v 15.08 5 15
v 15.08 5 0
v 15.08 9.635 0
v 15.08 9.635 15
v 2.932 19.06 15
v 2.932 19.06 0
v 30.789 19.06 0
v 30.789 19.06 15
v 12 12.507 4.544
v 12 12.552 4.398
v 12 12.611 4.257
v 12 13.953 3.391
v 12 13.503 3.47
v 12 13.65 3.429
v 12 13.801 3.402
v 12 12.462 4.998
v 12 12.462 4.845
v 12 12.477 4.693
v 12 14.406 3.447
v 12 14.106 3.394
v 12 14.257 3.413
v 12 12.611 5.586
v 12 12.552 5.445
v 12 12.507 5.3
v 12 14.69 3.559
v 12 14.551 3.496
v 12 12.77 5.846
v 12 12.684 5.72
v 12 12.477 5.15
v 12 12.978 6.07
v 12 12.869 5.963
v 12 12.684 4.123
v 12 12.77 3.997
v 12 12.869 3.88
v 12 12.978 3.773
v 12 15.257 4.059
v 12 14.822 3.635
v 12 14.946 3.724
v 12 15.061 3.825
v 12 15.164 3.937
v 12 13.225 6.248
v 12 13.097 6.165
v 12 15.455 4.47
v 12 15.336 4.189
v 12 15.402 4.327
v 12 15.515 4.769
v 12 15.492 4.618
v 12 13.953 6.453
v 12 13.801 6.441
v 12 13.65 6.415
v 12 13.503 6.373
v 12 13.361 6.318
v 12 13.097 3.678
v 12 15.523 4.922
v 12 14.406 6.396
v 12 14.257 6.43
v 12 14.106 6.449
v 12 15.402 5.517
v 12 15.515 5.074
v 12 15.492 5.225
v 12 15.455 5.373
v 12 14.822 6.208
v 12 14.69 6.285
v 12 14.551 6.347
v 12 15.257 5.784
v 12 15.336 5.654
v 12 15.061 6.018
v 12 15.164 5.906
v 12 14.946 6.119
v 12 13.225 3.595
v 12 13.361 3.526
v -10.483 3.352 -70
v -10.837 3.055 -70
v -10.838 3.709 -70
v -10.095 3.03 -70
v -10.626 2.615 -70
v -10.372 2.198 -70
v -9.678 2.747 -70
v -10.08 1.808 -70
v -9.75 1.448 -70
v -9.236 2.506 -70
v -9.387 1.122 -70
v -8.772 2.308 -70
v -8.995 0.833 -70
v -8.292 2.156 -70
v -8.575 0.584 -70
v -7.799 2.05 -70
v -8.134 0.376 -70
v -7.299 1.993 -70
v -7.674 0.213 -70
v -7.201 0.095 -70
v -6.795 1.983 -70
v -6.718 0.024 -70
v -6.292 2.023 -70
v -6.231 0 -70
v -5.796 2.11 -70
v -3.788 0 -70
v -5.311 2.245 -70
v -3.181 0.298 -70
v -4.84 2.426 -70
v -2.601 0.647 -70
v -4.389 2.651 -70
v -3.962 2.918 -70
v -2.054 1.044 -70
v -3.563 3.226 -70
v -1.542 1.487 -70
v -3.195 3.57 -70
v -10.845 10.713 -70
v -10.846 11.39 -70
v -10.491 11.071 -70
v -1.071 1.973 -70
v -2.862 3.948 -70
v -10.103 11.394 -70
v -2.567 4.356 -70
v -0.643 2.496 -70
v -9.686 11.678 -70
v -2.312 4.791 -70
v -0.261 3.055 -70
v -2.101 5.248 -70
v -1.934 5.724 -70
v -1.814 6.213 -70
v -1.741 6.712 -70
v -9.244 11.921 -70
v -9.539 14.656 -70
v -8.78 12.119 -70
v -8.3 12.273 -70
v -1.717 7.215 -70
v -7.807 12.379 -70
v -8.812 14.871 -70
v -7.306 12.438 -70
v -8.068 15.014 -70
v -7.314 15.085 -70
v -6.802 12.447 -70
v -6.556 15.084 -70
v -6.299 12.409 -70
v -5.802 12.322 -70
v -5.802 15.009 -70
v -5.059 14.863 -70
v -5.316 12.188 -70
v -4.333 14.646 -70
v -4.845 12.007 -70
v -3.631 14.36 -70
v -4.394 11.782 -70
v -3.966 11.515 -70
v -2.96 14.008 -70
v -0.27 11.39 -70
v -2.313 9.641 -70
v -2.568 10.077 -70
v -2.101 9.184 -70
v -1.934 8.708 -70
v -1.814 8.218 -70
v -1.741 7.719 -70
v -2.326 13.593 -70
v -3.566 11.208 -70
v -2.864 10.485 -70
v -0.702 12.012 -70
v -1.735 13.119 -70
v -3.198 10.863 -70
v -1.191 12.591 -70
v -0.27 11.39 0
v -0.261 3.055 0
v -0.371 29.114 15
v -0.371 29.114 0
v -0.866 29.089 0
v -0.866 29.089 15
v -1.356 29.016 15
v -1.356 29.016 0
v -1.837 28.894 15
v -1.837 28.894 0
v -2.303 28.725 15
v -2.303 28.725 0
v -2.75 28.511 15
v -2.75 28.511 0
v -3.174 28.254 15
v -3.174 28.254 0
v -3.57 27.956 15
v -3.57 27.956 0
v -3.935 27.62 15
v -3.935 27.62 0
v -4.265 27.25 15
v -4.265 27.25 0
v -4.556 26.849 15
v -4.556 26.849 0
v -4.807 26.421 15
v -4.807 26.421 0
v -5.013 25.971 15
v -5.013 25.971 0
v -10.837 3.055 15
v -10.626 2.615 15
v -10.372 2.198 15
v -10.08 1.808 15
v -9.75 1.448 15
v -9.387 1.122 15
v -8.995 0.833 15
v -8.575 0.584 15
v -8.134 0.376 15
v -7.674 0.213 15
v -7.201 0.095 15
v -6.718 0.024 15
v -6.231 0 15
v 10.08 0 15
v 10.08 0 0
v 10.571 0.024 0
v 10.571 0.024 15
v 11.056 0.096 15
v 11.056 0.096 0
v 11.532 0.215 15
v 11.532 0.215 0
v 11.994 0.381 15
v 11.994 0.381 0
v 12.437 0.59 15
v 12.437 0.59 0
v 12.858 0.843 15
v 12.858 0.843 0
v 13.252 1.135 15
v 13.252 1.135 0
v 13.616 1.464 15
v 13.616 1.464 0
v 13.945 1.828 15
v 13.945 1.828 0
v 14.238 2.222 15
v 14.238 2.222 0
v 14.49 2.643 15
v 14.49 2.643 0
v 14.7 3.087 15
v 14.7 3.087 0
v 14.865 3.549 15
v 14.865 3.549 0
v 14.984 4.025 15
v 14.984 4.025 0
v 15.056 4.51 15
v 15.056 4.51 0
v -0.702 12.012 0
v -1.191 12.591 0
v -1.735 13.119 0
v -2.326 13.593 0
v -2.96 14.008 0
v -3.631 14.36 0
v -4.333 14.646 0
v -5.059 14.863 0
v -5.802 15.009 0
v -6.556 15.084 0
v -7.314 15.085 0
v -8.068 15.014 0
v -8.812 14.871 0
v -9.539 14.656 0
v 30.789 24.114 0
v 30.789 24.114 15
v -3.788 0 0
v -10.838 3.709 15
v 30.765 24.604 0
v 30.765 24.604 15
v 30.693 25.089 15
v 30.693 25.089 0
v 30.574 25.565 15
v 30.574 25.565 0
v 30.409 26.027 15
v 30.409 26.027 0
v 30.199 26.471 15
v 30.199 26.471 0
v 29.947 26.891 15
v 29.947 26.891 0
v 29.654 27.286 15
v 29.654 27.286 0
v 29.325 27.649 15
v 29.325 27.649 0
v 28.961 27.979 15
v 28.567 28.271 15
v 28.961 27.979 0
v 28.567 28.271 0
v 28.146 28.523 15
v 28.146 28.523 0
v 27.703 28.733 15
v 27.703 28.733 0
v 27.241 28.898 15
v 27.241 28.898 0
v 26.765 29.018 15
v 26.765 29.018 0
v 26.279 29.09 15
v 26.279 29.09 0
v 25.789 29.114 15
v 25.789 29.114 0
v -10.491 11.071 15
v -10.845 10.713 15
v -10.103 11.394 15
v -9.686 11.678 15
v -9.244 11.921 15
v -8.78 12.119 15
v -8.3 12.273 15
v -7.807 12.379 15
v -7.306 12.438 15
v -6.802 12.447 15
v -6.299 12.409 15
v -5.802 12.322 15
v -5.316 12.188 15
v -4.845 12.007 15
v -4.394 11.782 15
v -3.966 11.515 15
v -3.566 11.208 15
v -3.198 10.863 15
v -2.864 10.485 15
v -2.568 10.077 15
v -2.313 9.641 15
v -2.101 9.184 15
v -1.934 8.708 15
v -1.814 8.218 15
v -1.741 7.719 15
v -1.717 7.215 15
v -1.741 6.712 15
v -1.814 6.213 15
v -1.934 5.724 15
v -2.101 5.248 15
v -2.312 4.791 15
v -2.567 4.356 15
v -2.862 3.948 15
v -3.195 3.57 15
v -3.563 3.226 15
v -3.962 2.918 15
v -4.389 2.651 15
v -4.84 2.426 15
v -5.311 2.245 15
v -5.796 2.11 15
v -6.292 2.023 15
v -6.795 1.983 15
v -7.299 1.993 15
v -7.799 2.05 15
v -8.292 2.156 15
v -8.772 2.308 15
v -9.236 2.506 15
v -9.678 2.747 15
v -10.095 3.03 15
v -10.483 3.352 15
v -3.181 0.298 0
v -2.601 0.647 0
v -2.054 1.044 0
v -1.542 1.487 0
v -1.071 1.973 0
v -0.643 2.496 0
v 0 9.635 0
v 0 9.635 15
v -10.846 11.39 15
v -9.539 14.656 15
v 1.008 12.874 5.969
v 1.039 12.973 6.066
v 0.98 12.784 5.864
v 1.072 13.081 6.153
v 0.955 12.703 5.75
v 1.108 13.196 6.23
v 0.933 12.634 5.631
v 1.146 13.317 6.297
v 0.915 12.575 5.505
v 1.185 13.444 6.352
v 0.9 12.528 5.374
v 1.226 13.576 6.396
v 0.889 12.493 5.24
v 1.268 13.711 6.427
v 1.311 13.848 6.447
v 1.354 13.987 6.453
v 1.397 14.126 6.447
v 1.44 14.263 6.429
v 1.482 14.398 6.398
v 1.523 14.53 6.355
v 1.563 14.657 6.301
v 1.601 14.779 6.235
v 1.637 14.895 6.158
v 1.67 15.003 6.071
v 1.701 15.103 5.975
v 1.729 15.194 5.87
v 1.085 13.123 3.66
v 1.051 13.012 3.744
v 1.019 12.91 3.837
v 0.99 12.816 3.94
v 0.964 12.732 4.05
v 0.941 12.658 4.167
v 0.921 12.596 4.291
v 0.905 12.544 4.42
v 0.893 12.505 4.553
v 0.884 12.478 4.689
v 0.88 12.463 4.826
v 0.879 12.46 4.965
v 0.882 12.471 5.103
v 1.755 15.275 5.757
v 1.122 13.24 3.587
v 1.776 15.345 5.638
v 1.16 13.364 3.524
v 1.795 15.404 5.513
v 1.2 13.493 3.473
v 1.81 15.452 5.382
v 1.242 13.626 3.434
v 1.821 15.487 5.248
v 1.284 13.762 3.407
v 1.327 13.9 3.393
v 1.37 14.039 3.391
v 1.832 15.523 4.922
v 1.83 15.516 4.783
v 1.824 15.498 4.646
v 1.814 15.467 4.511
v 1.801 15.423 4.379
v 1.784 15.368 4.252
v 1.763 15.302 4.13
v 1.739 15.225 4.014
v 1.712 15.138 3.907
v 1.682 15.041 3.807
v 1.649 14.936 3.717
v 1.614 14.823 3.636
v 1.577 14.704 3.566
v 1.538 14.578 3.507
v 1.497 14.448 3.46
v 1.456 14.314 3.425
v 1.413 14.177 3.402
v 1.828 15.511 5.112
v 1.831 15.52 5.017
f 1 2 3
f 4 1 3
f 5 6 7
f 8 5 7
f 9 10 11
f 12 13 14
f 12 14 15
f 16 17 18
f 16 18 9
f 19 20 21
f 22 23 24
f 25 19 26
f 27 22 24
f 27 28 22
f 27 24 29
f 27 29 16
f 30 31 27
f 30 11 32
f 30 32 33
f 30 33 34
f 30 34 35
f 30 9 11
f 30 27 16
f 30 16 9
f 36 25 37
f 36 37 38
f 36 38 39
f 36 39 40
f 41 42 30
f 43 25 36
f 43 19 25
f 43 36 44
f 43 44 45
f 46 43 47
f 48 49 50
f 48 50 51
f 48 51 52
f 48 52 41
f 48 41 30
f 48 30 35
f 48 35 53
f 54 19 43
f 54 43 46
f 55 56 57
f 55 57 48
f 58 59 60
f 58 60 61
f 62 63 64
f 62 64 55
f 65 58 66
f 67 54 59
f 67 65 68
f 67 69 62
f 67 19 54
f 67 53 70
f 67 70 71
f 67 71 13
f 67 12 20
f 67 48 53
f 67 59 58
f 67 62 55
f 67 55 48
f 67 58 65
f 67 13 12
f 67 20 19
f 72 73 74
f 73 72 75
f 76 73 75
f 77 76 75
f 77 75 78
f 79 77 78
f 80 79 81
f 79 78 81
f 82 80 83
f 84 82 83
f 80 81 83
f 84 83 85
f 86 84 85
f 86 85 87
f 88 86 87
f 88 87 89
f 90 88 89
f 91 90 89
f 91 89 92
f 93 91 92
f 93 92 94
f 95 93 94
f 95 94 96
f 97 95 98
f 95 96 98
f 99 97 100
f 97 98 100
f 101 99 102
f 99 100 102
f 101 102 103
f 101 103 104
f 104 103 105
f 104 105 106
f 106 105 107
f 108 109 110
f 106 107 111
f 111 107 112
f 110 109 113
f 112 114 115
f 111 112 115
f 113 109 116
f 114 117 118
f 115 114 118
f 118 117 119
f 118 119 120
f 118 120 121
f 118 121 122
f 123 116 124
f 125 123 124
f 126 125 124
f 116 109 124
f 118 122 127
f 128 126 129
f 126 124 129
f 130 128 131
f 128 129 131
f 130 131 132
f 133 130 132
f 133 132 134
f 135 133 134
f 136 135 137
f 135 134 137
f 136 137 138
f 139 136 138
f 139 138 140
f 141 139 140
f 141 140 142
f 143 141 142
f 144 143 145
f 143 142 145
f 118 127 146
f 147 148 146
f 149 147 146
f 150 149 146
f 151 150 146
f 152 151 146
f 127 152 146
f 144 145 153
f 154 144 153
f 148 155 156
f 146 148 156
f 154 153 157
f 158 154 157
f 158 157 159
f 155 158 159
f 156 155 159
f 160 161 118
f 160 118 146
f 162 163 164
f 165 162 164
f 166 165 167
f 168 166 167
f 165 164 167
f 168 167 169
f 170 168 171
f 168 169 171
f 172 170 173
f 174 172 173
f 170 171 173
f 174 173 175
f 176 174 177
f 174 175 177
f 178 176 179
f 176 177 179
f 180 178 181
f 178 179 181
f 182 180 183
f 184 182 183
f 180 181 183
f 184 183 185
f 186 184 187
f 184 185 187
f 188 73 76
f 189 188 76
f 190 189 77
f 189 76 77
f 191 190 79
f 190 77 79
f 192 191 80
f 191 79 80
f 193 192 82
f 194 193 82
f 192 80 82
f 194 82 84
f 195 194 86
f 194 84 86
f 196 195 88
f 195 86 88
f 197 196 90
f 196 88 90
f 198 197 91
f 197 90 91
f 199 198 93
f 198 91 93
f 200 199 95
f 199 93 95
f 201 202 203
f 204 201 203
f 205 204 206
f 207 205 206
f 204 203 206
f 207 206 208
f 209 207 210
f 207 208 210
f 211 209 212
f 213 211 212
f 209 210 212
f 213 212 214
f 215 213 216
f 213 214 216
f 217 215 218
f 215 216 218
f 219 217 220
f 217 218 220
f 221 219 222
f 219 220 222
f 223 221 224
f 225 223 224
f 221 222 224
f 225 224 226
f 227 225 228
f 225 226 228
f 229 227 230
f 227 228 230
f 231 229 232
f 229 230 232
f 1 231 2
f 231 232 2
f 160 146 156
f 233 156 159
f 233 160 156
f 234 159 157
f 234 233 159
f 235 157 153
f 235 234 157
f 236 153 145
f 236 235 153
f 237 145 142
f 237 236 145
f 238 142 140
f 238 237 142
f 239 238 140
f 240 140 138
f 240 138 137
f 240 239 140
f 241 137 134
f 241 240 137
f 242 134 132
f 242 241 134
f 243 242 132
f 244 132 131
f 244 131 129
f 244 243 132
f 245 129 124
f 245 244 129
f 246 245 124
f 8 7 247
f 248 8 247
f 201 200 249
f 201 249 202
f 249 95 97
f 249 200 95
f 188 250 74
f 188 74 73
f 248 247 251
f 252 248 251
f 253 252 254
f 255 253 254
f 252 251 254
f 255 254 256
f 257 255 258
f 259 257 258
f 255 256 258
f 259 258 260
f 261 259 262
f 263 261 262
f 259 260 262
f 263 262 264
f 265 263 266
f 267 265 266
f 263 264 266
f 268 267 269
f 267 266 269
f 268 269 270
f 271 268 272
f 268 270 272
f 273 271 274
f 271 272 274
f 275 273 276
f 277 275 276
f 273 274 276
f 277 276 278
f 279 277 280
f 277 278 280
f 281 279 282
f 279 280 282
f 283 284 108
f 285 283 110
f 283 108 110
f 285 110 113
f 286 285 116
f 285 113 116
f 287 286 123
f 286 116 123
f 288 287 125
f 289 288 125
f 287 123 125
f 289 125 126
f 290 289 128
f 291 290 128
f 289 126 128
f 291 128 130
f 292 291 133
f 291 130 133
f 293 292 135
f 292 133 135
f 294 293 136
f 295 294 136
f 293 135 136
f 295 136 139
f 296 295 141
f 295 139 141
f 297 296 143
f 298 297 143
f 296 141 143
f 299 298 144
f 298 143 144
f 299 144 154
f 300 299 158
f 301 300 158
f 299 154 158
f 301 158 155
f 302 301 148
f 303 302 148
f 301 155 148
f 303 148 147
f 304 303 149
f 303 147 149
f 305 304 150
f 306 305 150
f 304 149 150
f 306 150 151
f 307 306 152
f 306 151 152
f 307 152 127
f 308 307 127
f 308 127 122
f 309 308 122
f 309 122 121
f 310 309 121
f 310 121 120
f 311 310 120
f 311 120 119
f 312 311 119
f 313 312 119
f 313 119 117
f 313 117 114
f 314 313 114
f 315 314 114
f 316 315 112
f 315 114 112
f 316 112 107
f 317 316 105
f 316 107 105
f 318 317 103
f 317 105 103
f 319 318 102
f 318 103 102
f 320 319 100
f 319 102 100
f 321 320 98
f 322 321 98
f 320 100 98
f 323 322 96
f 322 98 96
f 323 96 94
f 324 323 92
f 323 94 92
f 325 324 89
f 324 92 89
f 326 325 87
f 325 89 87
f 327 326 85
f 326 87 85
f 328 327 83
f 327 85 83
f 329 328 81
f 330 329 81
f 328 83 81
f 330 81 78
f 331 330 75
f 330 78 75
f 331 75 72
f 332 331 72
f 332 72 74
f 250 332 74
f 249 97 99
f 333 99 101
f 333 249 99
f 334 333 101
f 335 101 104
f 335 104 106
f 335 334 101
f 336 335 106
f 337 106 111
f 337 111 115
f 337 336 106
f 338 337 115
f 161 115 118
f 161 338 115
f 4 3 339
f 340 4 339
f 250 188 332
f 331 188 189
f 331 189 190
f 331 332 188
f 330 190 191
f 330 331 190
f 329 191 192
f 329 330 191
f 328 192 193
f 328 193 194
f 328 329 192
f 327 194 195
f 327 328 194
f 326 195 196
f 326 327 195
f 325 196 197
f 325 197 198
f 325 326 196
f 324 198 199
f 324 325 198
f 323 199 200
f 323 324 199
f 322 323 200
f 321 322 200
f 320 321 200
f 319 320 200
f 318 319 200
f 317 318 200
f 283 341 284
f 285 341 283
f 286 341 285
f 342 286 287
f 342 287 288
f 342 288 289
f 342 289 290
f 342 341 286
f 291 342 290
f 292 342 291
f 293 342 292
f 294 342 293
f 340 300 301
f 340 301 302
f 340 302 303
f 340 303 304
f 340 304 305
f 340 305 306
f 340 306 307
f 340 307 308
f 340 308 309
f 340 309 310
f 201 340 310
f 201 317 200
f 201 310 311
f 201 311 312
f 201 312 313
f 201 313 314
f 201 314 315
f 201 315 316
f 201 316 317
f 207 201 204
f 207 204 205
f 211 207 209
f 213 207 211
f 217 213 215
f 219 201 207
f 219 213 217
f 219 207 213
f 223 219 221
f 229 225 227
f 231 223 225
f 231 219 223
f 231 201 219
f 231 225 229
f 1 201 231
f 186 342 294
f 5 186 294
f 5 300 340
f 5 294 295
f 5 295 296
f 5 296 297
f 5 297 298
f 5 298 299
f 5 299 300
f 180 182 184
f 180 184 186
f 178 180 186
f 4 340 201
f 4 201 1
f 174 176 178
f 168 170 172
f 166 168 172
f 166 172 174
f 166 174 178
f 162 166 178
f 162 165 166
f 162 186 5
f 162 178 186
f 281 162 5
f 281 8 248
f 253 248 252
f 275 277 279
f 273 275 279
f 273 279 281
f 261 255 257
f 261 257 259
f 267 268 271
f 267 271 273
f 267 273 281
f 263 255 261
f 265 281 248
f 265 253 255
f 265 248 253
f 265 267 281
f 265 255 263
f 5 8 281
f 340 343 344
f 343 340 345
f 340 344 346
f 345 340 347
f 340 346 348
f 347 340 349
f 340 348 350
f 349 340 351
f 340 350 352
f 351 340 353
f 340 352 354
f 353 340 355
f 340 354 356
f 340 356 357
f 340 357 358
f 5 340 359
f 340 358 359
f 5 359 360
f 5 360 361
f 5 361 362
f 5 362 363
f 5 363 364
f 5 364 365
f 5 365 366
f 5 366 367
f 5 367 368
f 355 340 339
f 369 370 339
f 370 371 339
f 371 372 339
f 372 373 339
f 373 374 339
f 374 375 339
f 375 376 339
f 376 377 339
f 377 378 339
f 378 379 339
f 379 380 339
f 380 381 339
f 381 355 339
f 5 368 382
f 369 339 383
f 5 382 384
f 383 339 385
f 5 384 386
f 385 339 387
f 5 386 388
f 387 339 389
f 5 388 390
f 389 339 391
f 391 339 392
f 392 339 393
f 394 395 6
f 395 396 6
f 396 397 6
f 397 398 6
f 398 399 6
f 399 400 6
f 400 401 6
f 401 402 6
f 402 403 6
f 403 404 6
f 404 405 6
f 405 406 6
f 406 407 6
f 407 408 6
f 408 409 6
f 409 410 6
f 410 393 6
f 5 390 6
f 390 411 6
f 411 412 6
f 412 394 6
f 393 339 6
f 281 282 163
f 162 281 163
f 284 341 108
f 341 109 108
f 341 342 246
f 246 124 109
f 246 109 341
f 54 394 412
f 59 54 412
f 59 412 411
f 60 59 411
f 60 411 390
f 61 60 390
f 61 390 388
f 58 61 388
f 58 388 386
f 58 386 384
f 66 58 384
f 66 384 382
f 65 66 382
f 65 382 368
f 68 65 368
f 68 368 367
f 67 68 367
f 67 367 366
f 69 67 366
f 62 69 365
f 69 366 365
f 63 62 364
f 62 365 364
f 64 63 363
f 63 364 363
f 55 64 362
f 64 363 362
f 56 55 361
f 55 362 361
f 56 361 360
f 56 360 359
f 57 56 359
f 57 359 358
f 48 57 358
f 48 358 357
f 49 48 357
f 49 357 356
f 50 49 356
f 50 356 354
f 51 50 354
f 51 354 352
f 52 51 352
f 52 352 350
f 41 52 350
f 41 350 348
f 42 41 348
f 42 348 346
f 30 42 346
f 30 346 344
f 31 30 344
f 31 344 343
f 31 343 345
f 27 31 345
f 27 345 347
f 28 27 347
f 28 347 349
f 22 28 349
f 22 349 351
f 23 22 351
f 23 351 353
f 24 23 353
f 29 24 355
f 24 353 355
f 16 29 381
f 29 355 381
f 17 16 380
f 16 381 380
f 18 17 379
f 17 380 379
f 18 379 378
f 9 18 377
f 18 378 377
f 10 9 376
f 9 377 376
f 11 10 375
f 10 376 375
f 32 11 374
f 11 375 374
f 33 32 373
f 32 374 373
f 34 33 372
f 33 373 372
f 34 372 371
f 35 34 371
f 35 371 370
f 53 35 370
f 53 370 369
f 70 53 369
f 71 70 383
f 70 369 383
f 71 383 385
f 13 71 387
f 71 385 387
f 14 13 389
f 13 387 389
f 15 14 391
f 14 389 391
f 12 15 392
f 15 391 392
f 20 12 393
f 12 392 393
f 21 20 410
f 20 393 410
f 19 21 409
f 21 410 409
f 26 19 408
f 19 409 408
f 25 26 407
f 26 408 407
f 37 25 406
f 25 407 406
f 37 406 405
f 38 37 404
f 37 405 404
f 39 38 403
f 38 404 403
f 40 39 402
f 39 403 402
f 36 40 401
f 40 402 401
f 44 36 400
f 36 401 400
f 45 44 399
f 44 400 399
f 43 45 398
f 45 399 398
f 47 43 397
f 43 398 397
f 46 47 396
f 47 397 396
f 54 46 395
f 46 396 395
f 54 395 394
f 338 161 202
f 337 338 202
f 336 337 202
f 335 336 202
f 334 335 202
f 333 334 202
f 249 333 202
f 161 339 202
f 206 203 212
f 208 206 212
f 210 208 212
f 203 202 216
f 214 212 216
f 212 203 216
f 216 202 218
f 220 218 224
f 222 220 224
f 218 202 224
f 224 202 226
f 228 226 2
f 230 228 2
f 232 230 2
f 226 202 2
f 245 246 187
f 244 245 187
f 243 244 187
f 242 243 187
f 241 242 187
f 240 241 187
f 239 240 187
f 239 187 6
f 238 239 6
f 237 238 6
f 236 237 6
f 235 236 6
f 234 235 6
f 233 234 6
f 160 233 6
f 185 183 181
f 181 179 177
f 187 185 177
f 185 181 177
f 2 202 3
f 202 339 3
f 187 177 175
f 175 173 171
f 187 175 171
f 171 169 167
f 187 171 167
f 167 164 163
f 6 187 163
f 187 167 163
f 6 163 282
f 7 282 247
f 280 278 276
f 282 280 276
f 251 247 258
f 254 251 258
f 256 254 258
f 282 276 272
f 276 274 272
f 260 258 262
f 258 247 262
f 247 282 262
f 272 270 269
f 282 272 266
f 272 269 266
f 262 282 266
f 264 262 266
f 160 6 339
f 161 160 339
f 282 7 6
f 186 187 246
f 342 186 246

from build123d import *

# Parameters (mm, degrees)
F1_DEPTH      = 15
F2_R          = 1.5314851855
F3_DEPTH      = 12
F4_DEPTH      = 70
F4_DEPTH_BACK = 15
F5_START      = 15
F5_DEPTH      = 10


with BuildPart() as f1:
    # F0 (on Top) → F1 (new body)
    with BuildSketch(Plane.XY):
        with BuildLine():
            Line((-3.7878935624, 0), (0, 0))
            Line((0, 0), (10.080419369, 0))
            ThreePointArc((10.080419369, 0), (13.615953275, 1.4644660941), (15.080419369, 5))
            Line((15.080419369, 5), (15.080419369, 9.6347117797))
            Line((15.080419369, 9.6347117797), (0, 9.6347117797))
            Line((0, 9.6347117797), (2.9323033523, 19.0599747002))
            Line((2.9323033523, 19.0599747002), (30.7891890407, 19.0599747002))
            Line((30.7891890407, 19.0599747002), (30.7891890407, 24.113586992))
            ThreePointArc((30.7891890407, 24.113586992), (29.3247229466, 27.649120898), (25.7891890407, 29.113586992))
            Line((25.7891890407, 29.113586992), (-0.3710855943, 29.113586992))
            ThreePointArc((-0.3710855943, 29.113586992), (-3.1742094006, 28.2539368476), (-5.0134508929, 25.9705857625))
            Line((-5.0134508929, 25.9705857625), (-9.5392790792, 14.6563360963))
            ThreePointArc((-9.5392790792, 14.6563360963), (-4.3326845259, 14.6456991486), (-0.2697541602, 11.3897297337))
            Line((-0.2697541602, 11.3897297337), (-0.2609815599, 3.0549731831))
            ThreePointArc((-0.2609815599, 3.0549731831), (-1.7930786348, 1.2603868413), (-3.7878935624, 0))
        make_face()
    extrude(amount=F1_DEPTH)

    # F2 (on Right) → F3 (join)
    with BuildSketch(Plane.YZ):
        with Locations((13.9912003651, 4.9216861258)):
            Circle(F2_R)
    extrude(amount=F3_DEPTH)

    # F0 (on Top) → F4 (join, two sides)
    with BuildSketch(Plane.XY) as f4_sk:
        with BuildLine():
            Line((-6.2310085321, 0), (-3.7878935624, 0))
            ThreePointArc((-3.7878935624, 0), (-1.7930786348, 1.2603868413), (-0.2609815599, 3.0549731831))
            Line((-0.2609815599, 3.0549731831), (-0.2697541602, 11.3897297337))
            ThreePointArc((-0.2697541602, 11.3897297337), (-4.3326845259, 14.6456991486), (-9.5392790792, 14.6563360963))
            Line((-9.5392790792, 14.6563360963), (-10.8459586275, 11.3897298455))
            Line((-10.8459586275, 11.3897298455), (-10.845246293, 10.7129482743))
            ThreePointArc((-10.845246293, 10.7129482743), (-5.0783751094, 12.1030419278), (-1.7169344136, 7.215314433))
            ThreePointArc((-1.7169344136, 7.215314433), (-5.0732316586, 2.3295608244), (-10.8378749283, 3.7094910741))
            Line((-10.8378749283, 3.7094910741), (-10.8371860272, 3.0549732948))
            ThreePointArc((-10.8371860272, 3.0549732948), (-8.9945991742, 0.8331586588), (-6.2310085321, 0))
        make_face()
    extrude(amount=-F4_DEPTH)
    extrude(f4_sk.sketch, amount=F4_DEPTH_BACK)

    # F0 (on Top) → F5 (cut)
    with BuildSketch(Plane.XY.offset(F5_START)):
        with BuildLine():
            Line((-10.8392332305, 4.9999998882), (-10.8378749283, 3.7094910741))
            ThreePointArc((-10.8378749283, 3.7094910741), (-5.0732316586, 2.3295608244), (-1.7169344136, 7.215314433))
            ThreePointArc((-1.7169344136, 7.215314433), (-5.0783751094, 12.1030419278), (-10.845246293, 10.7129482743))
            Line((-10.845246293, 10.7129482743), (-10.8440068229, 9.5353405923))
            Line((-10.8440068229, 9.5353405923), (-7.9774604405, 9.5353405923))
            Line((-7.9774604405, 9.5353405923), (-7.9774604405, 4.9999998882))
            Line((-7.9774604405, 4.9999998882), (-10.8392332305, 4.9999998882))
        make_face()
        Polygon((-10.8440068229, 9.5353405923), (-10.8392332305, 4.9999998882), (-7.9774604405, 4.9999998882), (-7.9774604405, 9.5353405923), align=None)
    extrude(amount=F5_DEPTH, mode=Mode.SUBTRACT)


solid = f1.part
